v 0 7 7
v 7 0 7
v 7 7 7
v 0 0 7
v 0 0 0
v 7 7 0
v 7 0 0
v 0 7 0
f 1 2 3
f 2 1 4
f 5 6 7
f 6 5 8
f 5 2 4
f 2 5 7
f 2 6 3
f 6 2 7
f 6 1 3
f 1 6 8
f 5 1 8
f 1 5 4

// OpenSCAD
// Helper library for include_*/use_* cases (not a case itself).
libvar = 42;
echo("lib top-level echo");
function libf(x) = x * libvar;
module libm() { cube(libvar); }
cube(7);
